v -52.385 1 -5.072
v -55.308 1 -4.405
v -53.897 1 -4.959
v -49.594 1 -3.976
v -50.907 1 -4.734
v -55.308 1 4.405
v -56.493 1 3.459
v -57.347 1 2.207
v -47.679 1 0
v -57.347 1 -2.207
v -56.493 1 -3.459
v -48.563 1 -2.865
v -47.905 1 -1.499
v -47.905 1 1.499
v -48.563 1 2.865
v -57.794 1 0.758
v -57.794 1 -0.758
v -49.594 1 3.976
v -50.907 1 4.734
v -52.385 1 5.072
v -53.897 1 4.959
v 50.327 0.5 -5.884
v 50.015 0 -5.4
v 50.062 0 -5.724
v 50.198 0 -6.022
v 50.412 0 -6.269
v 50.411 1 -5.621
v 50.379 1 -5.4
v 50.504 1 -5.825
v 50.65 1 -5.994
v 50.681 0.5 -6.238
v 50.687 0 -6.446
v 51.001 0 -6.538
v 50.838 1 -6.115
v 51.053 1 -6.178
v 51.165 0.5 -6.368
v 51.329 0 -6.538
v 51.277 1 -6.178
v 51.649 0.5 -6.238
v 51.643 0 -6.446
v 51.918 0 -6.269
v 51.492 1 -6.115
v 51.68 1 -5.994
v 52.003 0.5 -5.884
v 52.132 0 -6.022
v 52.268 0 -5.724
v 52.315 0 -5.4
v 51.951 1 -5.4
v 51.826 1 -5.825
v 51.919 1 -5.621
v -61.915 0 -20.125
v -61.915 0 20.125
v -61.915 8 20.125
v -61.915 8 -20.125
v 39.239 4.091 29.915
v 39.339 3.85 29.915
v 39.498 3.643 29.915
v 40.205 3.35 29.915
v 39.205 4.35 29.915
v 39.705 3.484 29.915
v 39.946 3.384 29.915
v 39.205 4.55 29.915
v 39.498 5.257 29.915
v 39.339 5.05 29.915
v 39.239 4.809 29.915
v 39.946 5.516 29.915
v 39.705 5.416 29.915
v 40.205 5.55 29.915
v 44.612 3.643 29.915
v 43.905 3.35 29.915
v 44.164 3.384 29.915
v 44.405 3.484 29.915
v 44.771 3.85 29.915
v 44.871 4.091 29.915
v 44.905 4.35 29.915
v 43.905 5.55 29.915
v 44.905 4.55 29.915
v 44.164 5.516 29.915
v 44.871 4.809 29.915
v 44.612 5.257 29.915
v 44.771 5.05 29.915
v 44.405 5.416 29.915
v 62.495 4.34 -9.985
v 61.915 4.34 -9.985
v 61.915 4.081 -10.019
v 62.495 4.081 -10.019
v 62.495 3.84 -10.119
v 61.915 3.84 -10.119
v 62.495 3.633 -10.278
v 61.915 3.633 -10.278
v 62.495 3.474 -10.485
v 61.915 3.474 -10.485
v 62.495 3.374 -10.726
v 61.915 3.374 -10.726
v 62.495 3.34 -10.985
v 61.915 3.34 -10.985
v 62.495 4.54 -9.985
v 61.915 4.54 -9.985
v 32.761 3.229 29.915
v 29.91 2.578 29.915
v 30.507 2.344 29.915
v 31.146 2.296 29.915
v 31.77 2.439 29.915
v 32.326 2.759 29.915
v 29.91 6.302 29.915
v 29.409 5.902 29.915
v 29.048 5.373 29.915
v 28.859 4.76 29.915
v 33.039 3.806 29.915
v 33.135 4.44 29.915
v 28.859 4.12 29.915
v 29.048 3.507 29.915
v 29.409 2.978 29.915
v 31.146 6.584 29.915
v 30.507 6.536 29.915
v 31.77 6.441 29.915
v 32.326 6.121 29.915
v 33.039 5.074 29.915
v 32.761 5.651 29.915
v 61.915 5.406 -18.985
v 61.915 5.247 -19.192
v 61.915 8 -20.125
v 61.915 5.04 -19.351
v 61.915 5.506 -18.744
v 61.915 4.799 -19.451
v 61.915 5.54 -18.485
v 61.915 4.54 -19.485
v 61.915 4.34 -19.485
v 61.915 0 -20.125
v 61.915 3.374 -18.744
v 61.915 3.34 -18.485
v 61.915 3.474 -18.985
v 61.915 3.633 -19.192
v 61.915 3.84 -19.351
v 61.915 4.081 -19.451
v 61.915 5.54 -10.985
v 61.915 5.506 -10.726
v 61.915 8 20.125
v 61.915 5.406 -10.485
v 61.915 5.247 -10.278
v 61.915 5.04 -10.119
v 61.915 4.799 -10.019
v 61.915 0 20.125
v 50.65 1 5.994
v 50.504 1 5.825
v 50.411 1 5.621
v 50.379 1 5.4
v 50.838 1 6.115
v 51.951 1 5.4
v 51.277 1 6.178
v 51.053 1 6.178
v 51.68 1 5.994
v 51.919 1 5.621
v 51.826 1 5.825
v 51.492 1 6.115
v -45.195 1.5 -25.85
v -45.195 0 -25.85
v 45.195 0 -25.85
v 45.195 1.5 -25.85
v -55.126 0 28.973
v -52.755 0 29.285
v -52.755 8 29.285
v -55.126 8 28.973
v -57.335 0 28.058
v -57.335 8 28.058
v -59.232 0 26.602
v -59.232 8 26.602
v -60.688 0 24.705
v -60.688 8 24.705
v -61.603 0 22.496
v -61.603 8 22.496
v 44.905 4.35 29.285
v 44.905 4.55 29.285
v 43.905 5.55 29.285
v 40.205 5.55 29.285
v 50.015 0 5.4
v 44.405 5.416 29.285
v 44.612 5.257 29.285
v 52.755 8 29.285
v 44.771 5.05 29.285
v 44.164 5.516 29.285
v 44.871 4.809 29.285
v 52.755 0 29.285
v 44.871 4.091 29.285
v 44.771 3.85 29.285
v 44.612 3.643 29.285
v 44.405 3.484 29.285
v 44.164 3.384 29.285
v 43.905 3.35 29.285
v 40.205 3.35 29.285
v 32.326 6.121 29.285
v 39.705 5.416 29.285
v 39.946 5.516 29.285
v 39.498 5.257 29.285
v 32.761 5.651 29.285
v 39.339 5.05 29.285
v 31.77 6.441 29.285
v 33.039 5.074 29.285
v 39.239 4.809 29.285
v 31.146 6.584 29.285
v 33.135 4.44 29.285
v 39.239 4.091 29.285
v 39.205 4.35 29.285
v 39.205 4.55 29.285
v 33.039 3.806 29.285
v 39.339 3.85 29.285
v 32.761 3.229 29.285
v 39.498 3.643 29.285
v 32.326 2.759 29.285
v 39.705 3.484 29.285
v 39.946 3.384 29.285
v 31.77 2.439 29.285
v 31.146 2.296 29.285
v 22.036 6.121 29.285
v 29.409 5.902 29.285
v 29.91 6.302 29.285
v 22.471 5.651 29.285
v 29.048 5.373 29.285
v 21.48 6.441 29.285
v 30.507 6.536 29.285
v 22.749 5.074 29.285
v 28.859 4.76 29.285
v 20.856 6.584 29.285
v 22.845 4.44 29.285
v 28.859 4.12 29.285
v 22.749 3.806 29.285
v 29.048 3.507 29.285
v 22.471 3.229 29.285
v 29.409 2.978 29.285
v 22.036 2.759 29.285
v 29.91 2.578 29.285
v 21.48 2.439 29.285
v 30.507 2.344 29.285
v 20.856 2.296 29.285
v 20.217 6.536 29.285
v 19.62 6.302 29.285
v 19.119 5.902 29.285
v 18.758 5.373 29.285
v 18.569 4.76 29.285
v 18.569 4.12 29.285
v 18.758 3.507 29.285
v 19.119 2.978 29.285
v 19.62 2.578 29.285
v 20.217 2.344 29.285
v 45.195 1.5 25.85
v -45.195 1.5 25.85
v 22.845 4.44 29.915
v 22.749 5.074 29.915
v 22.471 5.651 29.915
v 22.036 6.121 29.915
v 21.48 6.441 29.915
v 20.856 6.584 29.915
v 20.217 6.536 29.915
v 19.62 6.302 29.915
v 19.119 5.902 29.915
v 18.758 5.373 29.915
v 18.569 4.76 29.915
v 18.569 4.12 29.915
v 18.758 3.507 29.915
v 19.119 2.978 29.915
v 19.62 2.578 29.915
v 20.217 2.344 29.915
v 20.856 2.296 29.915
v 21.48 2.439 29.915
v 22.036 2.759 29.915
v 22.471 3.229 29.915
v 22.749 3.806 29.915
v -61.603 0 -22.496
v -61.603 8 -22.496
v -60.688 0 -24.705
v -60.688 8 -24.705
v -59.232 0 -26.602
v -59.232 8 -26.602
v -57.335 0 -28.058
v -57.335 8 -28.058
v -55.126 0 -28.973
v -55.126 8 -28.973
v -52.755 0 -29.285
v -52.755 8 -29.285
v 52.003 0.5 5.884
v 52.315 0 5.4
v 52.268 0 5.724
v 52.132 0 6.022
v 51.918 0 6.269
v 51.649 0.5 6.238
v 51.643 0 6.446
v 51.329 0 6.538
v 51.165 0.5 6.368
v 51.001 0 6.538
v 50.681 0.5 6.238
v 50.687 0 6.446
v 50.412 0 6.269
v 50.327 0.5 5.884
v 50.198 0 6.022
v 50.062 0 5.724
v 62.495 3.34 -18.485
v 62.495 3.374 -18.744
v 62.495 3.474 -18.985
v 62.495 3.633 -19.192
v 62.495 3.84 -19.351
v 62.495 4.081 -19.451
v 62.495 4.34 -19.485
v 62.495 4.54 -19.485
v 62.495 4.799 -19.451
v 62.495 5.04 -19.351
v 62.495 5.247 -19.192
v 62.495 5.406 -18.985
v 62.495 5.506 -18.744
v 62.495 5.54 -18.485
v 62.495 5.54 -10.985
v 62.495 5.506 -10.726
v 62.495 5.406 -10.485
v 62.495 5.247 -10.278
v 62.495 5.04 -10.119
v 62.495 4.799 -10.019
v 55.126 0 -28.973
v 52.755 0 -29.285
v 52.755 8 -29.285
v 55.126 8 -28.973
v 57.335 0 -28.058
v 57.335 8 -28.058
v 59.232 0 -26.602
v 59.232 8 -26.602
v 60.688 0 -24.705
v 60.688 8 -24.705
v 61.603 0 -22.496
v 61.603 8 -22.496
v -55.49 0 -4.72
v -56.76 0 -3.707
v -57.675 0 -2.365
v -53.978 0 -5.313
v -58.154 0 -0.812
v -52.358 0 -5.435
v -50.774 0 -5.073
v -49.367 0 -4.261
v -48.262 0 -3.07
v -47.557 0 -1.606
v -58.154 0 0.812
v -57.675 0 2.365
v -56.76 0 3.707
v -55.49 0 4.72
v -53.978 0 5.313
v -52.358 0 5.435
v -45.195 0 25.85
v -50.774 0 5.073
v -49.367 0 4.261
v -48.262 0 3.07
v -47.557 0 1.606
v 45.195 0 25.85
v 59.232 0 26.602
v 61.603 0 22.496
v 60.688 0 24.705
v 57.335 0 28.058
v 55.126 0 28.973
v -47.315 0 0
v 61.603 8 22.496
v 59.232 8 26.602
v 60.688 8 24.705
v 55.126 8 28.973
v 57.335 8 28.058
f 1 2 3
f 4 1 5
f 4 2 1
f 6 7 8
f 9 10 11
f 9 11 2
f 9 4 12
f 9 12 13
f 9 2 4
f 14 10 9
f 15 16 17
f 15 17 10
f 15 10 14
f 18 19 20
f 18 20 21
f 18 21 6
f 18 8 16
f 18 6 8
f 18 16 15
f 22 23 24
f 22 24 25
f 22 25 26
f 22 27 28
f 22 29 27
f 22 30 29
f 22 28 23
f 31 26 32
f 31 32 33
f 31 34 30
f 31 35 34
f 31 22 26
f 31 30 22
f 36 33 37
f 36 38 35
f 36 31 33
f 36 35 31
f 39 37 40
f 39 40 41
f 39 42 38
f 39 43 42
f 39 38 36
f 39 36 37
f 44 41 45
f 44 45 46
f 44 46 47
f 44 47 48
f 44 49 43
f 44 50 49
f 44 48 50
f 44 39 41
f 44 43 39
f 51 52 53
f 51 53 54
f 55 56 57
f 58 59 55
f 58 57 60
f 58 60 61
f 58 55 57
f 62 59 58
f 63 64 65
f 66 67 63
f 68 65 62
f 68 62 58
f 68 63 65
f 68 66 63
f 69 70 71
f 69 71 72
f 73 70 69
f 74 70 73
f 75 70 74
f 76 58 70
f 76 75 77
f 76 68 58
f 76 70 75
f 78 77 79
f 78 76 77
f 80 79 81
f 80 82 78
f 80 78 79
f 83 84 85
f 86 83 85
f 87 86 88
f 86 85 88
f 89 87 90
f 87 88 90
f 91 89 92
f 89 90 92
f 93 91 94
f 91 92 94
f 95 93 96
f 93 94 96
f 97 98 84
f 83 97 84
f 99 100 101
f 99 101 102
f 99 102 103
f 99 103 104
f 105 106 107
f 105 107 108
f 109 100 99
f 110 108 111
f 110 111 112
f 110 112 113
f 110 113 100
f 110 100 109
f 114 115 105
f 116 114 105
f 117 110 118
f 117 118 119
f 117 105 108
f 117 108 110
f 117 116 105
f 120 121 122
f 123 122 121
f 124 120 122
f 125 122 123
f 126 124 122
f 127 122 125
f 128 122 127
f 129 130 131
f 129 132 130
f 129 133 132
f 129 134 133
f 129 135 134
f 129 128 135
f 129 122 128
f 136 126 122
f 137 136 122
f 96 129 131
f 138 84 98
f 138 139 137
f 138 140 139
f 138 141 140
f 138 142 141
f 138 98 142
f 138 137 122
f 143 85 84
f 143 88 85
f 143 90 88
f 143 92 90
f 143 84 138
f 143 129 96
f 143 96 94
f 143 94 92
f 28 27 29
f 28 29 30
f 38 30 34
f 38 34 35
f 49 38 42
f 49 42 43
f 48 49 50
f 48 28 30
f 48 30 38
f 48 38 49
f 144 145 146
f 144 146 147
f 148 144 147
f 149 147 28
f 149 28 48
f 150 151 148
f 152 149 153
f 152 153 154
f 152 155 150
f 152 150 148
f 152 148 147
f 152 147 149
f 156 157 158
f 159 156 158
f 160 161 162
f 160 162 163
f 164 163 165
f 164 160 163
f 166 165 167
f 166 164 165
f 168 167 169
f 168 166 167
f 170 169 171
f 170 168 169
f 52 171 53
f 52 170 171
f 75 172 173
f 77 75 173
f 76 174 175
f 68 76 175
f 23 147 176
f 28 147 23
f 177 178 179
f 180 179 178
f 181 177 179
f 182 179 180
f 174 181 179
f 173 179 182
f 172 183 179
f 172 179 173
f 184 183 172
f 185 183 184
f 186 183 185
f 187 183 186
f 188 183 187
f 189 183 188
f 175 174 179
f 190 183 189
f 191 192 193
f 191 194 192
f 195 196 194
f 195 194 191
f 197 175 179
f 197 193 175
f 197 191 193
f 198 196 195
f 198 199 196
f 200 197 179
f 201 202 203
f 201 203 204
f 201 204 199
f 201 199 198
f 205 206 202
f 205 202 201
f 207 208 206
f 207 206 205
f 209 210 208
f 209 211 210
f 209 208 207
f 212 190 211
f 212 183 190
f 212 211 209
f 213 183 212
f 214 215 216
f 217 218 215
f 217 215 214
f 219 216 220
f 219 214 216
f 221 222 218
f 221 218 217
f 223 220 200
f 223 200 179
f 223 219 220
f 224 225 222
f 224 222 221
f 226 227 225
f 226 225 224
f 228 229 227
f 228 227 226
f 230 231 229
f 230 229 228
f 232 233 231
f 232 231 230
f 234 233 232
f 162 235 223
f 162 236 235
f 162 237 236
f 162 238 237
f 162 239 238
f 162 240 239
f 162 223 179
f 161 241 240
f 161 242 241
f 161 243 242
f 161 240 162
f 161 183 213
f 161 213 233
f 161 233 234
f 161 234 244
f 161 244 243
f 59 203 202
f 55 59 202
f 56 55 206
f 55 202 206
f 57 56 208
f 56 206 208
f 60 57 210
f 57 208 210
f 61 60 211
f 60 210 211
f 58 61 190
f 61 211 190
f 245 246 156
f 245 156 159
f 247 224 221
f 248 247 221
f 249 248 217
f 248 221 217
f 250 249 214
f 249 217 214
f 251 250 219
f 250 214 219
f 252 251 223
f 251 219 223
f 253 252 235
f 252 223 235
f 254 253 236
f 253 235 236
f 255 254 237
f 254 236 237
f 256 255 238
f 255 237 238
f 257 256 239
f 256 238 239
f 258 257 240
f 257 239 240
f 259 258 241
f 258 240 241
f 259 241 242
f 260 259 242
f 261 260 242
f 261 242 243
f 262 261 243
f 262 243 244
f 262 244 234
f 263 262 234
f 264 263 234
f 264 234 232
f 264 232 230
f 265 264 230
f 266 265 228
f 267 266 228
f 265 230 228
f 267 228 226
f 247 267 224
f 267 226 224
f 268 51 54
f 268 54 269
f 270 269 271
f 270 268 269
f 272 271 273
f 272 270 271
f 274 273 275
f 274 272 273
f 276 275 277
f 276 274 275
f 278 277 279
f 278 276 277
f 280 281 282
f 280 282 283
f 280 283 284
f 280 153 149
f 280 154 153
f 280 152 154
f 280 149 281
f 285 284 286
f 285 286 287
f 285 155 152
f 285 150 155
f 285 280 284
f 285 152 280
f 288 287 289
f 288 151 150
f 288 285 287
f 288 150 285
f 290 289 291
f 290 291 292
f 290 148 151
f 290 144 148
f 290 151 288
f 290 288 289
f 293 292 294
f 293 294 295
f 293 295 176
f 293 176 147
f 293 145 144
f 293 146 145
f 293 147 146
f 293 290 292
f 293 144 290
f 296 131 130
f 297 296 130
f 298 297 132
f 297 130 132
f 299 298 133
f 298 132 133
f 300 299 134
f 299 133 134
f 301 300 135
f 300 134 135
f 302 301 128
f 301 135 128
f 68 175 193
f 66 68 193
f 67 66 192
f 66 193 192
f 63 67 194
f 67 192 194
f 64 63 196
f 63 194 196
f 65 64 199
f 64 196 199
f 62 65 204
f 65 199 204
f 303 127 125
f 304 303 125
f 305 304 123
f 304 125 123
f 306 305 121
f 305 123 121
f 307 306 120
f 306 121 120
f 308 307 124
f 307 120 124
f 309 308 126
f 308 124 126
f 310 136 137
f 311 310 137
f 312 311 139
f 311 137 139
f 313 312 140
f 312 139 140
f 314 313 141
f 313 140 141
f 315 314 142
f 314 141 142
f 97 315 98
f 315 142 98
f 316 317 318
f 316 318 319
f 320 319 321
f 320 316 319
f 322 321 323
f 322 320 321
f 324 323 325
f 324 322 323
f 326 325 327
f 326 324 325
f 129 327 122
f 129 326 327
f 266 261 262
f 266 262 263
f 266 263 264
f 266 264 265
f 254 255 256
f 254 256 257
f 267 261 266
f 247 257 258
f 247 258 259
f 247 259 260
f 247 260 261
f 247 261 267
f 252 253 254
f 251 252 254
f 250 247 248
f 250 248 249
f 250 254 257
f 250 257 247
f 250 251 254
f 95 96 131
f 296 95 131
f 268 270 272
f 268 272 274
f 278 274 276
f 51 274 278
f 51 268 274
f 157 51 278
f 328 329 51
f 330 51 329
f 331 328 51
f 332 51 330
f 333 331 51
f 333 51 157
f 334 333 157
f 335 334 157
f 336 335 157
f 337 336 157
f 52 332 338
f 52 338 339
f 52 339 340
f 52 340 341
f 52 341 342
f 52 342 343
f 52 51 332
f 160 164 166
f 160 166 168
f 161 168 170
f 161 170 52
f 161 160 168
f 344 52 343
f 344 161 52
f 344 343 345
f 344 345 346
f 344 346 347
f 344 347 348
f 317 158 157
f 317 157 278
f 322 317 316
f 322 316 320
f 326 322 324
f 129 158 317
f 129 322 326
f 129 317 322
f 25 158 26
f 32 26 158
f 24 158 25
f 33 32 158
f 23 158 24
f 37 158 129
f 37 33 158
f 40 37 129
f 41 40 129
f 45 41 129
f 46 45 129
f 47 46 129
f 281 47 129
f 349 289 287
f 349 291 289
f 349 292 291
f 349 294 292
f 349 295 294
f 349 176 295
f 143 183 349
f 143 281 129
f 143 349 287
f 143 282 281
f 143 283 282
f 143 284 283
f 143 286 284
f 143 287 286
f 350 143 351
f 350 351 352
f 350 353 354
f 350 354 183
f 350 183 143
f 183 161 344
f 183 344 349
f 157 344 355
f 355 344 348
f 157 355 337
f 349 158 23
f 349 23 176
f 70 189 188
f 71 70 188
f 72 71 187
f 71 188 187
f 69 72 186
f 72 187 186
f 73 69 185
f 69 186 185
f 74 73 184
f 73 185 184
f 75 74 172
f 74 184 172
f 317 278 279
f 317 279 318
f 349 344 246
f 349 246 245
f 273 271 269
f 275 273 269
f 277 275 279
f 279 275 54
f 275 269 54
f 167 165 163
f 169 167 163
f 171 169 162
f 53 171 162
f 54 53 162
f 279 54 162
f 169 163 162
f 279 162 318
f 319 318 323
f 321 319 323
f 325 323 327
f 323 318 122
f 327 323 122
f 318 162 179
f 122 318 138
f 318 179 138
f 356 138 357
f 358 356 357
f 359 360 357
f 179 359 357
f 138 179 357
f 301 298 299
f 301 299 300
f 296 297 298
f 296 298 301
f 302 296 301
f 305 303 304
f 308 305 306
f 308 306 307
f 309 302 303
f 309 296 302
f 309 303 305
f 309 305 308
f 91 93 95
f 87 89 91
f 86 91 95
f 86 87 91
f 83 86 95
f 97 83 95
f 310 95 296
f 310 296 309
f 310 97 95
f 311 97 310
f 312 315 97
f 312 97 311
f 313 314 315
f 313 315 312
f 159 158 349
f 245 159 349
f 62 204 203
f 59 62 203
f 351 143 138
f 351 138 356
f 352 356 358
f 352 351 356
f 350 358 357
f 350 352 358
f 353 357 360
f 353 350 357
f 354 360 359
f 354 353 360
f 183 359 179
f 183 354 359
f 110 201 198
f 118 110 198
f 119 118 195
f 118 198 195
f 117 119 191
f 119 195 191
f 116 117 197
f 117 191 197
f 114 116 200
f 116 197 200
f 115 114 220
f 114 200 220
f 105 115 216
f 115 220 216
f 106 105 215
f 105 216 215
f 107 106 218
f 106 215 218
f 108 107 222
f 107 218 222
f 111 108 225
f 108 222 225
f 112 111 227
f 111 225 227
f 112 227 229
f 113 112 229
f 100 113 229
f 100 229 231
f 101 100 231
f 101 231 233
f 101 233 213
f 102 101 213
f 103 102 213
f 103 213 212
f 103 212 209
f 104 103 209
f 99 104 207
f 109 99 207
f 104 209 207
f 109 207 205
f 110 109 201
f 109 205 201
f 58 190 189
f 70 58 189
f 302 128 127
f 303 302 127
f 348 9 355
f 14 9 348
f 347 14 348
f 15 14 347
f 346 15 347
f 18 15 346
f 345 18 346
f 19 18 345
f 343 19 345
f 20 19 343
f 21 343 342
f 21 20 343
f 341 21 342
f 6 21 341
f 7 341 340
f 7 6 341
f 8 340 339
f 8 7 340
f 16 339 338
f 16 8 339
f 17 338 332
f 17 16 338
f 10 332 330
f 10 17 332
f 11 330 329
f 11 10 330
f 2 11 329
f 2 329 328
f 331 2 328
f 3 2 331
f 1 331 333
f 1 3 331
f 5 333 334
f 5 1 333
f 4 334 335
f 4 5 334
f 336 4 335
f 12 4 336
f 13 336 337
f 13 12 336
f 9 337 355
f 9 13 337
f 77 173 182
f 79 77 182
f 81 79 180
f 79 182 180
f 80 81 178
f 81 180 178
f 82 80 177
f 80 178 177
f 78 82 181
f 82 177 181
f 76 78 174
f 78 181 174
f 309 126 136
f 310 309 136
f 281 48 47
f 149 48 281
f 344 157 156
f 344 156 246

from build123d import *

# Parameters (mm, degrees)
F1_DEPTH  = 8
F2_R      = 5.45
F3_DEPTH  = 1
F3_TAPER  = 20
F5_DEPTH  = 1
F5_TAPER  = 20
F6_R      = 2.15
F7_DEPTH  = 0.63
F8_W      = 90.39
F8_H      = 51.7
F9_DEPTH  = 1.5
F11_DEPTH = 0.58


with BuildPart() as f1:
    # F0 (on Front) → F1 (new body)
    with BuildSketch(Plane.XZ):
        with BuildLine():
            ThreePointArc((-61.915, -20.125), (-59.2320981157, -26.6020981157), (-52.755, -29.285))
            Line((-52.755, -29.285), (52.755, -29.285))
            ThreePointArc((52.755, -29.285), (59.2320981157, -26.6020981157), (61.915, -20.125))
            Line((61.915, -20.125), (61.915, 20.125))
            ThreePointArc((61.915, 20.125), (59.2320981157, 26.6020981157), (52.755, 29.285))
            Line((52.755, 29.285), (-52.755, 29.285))
            ThreePointArc((-52.755, 29.285), (-59.2320981157, 26.6020981157), (-61.915, 20.125))
            Line((-61.915, 20.125), (-61.915, -20.125))
        make_face()
    extrude(amount=-F1_DEPTH)

    # F2 (on face) → F3 (cut)
    with BuildSketch(Plane.XZ):
        with Locations((-52.765, 0)):
            Circle(F2_R)
    extrude(amount=-F3_DEPTH, taper=F3_TAPER, mode=Mode.SUBTRACT)

    # F4 (on face) → F5 (cut)
    with BuildSketch(Plane.XZ):
        with BuildLine():
            ThreePointArc((52.315, 5.4), (51.165, 6.55), (50.015, 5.4))
            Line((50.015, 5.4), (50.015, -5.4))
            ThreePointArc((50.015, -5.4), (51.165, -6.55), (52.315, -5.4))
            Line((52.315, -5.4), (52.315, 5.4))
        make_face()
    extrude(amount=-F5_DEPTH, taper=F5_TAPER, mode=Mode.SUBTRACT)

    # F6 (on face) → F7 (join)
    with BuildSketch(Plane.XY.offset(29.285)):
        with Locations((20.695, 4.44)):
            Circle(F6_R)
        with Locations((30.985, 4.44)):
            Circle(F6_R)
        with BuildLine():
            Line((43.905, 5.55), (40.205, 5.55))
            ThreePointArc((40.205, 5.55), (39.4978932188, 5.2571067812), (39.205, 4.55))
            Line((39.205, 4.55), (39.205, 4.35))
            ThreePointArc((39.205, 4.35), (39.4978932188, 3.6428932188), (40.205, 3.35))
            Line((40.205, 3.35), (43.905, 3.35))
            ThreePointArc((43.905, 3.35), (44.6121067812, 3.6428932188), (44.905, 4.35))
            Line((44.905, 4.35), (44.905, 4.55))
            ThreePointArc((44.905, 4.55), (44.6121067812, 5.2571067812), (43.905, 5.55))
        make_face()
    extrude(amount=F7_DEPTH)

    # F8 (on face) → F9 (cut)
    with BuildSketch(Plane.XZ):
        Rectangle(F8_W, F8_H)
    extrude(amount=-F9_DEPTH, mode=Mode.SUBTRACT)

    # F10 (on face) → F11 (join)
    with BuildSketch(Plane.YZ.offset(61.915)):
        with BuildLine():
            Line((4.54, -9.985), (4.34, -9.985))
            ThreePointArc((4.34, -9.985), (3.6328932188, -10.2778932188), (3.34, -10.985))
            Line((3.34, -10.985), (3.34, -18.485))
            ThreePointArc((3.34, -18.485), (3.6328932188, -19.1921067812), (4.34, -19.485))
            Line((4.34, -19.485), (4.54, -19.485))
            ThreePointArc((4.54, -19.485), (5.2471067812, -19.1921067812), (5.54, -18.485))
            Line((5.54, -18.485), (5.54, -10.985))
            ThreePointArc((5.54, -10.985), (5.2471067812, -10.2778932188), (4.54, -9.985))
        make_face()
    extrude(amount=F11_DEPTH)


solid = f1.part
